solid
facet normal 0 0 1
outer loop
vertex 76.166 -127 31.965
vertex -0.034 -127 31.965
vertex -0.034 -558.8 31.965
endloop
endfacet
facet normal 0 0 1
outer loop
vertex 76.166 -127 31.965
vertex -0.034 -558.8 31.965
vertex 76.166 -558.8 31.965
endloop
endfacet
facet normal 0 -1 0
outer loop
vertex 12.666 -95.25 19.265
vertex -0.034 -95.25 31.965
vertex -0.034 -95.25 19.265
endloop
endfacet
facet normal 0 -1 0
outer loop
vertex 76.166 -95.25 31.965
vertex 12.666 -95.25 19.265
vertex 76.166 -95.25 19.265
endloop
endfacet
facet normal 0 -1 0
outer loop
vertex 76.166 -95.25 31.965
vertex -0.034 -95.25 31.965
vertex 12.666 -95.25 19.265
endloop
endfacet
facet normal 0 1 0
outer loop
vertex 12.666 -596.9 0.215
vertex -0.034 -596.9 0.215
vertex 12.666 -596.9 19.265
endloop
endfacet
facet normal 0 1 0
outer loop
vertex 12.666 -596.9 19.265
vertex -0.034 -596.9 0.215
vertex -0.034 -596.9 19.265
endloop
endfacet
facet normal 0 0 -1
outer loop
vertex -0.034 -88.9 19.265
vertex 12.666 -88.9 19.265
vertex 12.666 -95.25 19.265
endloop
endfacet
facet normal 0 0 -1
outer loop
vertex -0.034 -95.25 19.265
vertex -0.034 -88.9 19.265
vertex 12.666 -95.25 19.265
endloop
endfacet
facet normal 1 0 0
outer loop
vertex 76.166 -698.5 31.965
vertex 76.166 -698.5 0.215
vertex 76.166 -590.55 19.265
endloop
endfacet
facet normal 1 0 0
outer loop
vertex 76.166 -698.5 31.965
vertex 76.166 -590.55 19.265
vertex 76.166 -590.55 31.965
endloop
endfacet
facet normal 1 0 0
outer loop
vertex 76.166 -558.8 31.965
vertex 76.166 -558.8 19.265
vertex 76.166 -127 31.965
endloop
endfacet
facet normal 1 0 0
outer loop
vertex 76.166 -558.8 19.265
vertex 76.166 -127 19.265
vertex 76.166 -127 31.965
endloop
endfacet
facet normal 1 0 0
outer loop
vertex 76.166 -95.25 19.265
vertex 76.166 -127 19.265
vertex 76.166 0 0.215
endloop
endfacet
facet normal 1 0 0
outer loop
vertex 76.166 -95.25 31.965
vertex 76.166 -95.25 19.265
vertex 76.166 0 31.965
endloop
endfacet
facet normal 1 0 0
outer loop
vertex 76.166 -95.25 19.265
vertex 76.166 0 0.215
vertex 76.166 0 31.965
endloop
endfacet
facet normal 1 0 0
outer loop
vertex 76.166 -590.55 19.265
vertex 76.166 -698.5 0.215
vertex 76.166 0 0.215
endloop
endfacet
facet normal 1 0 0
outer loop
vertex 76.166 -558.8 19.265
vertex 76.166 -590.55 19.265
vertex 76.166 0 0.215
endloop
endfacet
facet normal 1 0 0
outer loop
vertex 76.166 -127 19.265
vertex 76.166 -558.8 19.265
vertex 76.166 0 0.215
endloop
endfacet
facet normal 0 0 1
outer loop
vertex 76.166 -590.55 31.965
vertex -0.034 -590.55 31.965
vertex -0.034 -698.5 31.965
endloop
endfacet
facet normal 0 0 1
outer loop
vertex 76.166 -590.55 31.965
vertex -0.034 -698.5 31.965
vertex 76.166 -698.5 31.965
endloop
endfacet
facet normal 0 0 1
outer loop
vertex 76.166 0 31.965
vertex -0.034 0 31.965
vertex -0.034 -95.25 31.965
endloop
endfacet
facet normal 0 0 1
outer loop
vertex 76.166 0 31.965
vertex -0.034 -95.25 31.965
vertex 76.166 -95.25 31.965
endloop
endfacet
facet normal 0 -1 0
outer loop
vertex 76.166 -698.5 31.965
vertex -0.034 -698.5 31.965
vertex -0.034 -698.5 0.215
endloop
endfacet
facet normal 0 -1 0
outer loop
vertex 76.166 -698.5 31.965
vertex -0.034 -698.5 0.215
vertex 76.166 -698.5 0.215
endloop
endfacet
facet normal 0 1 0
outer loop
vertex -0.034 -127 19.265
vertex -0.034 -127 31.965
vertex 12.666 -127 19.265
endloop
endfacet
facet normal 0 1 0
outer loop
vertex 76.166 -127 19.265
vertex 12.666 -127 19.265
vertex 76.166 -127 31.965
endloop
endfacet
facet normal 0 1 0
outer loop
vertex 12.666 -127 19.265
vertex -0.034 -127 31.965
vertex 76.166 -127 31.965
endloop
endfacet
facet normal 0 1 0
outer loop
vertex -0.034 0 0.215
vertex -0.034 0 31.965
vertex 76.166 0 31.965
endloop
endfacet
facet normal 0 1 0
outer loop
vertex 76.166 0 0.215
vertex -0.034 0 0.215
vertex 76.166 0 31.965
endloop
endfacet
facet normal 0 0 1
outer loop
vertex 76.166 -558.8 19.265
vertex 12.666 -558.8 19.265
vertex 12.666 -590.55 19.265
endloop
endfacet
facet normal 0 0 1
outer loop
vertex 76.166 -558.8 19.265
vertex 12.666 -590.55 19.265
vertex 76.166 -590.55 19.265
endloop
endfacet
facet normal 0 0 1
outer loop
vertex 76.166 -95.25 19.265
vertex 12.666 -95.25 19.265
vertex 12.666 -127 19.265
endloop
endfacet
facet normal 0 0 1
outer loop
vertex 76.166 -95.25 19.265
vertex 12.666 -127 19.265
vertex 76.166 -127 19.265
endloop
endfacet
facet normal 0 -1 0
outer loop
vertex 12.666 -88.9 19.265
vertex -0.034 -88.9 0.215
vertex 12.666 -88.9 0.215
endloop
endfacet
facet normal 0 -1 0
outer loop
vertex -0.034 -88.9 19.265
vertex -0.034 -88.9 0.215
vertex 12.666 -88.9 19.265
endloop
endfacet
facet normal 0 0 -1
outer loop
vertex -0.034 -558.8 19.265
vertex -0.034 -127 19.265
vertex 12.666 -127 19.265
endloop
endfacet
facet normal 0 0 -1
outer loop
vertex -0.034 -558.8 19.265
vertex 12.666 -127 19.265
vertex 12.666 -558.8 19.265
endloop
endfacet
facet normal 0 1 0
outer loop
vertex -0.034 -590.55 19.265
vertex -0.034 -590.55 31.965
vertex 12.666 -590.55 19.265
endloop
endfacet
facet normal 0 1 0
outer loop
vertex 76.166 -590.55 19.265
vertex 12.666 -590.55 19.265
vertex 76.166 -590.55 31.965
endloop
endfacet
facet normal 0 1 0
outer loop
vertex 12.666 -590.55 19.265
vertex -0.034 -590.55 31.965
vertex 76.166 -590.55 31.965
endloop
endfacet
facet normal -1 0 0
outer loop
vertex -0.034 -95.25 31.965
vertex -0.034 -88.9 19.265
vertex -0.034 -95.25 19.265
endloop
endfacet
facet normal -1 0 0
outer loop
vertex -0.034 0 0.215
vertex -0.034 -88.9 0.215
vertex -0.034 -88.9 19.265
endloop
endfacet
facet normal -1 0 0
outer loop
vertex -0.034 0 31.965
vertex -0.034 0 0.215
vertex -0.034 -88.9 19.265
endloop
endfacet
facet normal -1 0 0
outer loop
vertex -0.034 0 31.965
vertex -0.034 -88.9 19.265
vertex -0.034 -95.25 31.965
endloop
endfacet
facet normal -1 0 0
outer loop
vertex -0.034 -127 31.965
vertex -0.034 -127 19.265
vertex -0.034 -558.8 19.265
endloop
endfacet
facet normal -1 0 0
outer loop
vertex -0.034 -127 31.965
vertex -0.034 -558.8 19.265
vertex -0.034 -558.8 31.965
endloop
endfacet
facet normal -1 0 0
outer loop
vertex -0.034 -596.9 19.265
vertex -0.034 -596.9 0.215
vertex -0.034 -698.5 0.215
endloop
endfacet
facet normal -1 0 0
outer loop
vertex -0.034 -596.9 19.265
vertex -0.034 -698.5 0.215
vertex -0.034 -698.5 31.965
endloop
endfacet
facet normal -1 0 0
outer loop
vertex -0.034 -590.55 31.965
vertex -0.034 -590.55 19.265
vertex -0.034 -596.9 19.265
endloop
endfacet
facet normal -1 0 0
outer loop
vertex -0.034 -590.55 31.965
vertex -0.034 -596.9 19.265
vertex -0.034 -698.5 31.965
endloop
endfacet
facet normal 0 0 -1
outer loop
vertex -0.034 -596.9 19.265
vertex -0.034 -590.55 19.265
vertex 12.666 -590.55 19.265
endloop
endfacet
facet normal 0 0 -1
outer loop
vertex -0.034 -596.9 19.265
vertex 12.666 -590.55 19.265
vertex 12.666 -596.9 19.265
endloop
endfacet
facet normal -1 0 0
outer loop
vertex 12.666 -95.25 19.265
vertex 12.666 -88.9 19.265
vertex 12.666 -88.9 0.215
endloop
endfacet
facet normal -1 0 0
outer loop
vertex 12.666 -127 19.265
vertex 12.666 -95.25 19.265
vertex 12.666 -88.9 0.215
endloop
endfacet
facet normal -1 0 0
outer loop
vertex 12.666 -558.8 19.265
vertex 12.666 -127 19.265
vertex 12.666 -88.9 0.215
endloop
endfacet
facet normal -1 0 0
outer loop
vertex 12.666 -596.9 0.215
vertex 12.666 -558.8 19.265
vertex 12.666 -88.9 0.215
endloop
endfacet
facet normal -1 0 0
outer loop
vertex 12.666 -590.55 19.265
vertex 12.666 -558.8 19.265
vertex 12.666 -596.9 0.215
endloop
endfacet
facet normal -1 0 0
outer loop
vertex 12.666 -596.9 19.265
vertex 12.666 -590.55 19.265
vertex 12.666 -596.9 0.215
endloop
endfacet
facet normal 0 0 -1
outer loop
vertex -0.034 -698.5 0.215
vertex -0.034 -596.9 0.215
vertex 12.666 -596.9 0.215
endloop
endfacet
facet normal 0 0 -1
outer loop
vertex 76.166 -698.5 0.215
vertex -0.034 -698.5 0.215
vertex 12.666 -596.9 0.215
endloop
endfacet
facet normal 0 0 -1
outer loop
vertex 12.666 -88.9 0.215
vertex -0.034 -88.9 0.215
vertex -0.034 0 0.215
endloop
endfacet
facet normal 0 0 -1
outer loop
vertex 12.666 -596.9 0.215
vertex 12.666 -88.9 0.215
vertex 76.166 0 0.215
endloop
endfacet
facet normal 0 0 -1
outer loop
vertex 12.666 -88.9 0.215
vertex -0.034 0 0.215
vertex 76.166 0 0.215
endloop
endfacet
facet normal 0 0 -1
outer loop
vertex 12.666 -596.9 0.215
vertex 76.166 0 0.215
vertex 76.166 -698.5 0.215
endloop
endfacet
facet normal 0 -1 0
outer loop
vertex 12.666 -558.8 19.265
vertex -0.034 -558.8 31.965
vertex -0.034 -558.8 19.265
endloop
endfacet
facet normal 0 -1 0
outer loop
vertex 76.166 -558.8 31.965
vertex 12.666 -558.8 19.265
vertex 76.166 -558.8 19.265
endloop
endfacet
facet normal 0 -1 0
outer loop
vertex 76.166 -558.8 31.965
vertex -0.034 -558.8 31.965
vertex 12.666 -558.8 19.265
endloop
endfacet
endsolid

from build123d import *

# Parameters (mm, degrees)
F0_W     = 76.2
F0_H     = 31.75
F1_DEPTH = 698.5
F2_W     = 508
F2_H     = 19.05
F3_DEPTH = 12.7
F4_W     = 76.2
F4_H     = 31.75
F5_DEPTH = 12.7


with BuildPart() as f1:
    # F0 (on Front) → F1 (new body)
    with BuildSketch(Plane.XZ):
        with Locations((38.066154, 16.090209)):
            Rectangle(F0_W, F0_H)
    extrude(amount=F1_DEPTH)

    # F2 (on face) → F3 (cut)
    with BuildSketch(Plane(origin=(-0.033846, 0, 0), x_dir=(0, -1, 0), z_dir=(-1, 0, 0))):
        with Locations((342.9, 9.740209)):
            Rectangle(F2_W, F2_H)
    extrude(amount=-F3_DEPTH, mode=Mode.SUBTRACT)

    # F4 (on face) → F5 (cut)
    with BuildSketch(Plane.XY.offset(31.965209)):
        with Locations((38.066154, -574.675)):
            Rectangle(F4_W, F4_H)
        with Locations((38.066154, -111.125)):
            Rectangle(F4_W, F4_H)
    extrude(amount=-F5_DEPTH, mode=Mode.SUBTRACT)


solid = f1.part
